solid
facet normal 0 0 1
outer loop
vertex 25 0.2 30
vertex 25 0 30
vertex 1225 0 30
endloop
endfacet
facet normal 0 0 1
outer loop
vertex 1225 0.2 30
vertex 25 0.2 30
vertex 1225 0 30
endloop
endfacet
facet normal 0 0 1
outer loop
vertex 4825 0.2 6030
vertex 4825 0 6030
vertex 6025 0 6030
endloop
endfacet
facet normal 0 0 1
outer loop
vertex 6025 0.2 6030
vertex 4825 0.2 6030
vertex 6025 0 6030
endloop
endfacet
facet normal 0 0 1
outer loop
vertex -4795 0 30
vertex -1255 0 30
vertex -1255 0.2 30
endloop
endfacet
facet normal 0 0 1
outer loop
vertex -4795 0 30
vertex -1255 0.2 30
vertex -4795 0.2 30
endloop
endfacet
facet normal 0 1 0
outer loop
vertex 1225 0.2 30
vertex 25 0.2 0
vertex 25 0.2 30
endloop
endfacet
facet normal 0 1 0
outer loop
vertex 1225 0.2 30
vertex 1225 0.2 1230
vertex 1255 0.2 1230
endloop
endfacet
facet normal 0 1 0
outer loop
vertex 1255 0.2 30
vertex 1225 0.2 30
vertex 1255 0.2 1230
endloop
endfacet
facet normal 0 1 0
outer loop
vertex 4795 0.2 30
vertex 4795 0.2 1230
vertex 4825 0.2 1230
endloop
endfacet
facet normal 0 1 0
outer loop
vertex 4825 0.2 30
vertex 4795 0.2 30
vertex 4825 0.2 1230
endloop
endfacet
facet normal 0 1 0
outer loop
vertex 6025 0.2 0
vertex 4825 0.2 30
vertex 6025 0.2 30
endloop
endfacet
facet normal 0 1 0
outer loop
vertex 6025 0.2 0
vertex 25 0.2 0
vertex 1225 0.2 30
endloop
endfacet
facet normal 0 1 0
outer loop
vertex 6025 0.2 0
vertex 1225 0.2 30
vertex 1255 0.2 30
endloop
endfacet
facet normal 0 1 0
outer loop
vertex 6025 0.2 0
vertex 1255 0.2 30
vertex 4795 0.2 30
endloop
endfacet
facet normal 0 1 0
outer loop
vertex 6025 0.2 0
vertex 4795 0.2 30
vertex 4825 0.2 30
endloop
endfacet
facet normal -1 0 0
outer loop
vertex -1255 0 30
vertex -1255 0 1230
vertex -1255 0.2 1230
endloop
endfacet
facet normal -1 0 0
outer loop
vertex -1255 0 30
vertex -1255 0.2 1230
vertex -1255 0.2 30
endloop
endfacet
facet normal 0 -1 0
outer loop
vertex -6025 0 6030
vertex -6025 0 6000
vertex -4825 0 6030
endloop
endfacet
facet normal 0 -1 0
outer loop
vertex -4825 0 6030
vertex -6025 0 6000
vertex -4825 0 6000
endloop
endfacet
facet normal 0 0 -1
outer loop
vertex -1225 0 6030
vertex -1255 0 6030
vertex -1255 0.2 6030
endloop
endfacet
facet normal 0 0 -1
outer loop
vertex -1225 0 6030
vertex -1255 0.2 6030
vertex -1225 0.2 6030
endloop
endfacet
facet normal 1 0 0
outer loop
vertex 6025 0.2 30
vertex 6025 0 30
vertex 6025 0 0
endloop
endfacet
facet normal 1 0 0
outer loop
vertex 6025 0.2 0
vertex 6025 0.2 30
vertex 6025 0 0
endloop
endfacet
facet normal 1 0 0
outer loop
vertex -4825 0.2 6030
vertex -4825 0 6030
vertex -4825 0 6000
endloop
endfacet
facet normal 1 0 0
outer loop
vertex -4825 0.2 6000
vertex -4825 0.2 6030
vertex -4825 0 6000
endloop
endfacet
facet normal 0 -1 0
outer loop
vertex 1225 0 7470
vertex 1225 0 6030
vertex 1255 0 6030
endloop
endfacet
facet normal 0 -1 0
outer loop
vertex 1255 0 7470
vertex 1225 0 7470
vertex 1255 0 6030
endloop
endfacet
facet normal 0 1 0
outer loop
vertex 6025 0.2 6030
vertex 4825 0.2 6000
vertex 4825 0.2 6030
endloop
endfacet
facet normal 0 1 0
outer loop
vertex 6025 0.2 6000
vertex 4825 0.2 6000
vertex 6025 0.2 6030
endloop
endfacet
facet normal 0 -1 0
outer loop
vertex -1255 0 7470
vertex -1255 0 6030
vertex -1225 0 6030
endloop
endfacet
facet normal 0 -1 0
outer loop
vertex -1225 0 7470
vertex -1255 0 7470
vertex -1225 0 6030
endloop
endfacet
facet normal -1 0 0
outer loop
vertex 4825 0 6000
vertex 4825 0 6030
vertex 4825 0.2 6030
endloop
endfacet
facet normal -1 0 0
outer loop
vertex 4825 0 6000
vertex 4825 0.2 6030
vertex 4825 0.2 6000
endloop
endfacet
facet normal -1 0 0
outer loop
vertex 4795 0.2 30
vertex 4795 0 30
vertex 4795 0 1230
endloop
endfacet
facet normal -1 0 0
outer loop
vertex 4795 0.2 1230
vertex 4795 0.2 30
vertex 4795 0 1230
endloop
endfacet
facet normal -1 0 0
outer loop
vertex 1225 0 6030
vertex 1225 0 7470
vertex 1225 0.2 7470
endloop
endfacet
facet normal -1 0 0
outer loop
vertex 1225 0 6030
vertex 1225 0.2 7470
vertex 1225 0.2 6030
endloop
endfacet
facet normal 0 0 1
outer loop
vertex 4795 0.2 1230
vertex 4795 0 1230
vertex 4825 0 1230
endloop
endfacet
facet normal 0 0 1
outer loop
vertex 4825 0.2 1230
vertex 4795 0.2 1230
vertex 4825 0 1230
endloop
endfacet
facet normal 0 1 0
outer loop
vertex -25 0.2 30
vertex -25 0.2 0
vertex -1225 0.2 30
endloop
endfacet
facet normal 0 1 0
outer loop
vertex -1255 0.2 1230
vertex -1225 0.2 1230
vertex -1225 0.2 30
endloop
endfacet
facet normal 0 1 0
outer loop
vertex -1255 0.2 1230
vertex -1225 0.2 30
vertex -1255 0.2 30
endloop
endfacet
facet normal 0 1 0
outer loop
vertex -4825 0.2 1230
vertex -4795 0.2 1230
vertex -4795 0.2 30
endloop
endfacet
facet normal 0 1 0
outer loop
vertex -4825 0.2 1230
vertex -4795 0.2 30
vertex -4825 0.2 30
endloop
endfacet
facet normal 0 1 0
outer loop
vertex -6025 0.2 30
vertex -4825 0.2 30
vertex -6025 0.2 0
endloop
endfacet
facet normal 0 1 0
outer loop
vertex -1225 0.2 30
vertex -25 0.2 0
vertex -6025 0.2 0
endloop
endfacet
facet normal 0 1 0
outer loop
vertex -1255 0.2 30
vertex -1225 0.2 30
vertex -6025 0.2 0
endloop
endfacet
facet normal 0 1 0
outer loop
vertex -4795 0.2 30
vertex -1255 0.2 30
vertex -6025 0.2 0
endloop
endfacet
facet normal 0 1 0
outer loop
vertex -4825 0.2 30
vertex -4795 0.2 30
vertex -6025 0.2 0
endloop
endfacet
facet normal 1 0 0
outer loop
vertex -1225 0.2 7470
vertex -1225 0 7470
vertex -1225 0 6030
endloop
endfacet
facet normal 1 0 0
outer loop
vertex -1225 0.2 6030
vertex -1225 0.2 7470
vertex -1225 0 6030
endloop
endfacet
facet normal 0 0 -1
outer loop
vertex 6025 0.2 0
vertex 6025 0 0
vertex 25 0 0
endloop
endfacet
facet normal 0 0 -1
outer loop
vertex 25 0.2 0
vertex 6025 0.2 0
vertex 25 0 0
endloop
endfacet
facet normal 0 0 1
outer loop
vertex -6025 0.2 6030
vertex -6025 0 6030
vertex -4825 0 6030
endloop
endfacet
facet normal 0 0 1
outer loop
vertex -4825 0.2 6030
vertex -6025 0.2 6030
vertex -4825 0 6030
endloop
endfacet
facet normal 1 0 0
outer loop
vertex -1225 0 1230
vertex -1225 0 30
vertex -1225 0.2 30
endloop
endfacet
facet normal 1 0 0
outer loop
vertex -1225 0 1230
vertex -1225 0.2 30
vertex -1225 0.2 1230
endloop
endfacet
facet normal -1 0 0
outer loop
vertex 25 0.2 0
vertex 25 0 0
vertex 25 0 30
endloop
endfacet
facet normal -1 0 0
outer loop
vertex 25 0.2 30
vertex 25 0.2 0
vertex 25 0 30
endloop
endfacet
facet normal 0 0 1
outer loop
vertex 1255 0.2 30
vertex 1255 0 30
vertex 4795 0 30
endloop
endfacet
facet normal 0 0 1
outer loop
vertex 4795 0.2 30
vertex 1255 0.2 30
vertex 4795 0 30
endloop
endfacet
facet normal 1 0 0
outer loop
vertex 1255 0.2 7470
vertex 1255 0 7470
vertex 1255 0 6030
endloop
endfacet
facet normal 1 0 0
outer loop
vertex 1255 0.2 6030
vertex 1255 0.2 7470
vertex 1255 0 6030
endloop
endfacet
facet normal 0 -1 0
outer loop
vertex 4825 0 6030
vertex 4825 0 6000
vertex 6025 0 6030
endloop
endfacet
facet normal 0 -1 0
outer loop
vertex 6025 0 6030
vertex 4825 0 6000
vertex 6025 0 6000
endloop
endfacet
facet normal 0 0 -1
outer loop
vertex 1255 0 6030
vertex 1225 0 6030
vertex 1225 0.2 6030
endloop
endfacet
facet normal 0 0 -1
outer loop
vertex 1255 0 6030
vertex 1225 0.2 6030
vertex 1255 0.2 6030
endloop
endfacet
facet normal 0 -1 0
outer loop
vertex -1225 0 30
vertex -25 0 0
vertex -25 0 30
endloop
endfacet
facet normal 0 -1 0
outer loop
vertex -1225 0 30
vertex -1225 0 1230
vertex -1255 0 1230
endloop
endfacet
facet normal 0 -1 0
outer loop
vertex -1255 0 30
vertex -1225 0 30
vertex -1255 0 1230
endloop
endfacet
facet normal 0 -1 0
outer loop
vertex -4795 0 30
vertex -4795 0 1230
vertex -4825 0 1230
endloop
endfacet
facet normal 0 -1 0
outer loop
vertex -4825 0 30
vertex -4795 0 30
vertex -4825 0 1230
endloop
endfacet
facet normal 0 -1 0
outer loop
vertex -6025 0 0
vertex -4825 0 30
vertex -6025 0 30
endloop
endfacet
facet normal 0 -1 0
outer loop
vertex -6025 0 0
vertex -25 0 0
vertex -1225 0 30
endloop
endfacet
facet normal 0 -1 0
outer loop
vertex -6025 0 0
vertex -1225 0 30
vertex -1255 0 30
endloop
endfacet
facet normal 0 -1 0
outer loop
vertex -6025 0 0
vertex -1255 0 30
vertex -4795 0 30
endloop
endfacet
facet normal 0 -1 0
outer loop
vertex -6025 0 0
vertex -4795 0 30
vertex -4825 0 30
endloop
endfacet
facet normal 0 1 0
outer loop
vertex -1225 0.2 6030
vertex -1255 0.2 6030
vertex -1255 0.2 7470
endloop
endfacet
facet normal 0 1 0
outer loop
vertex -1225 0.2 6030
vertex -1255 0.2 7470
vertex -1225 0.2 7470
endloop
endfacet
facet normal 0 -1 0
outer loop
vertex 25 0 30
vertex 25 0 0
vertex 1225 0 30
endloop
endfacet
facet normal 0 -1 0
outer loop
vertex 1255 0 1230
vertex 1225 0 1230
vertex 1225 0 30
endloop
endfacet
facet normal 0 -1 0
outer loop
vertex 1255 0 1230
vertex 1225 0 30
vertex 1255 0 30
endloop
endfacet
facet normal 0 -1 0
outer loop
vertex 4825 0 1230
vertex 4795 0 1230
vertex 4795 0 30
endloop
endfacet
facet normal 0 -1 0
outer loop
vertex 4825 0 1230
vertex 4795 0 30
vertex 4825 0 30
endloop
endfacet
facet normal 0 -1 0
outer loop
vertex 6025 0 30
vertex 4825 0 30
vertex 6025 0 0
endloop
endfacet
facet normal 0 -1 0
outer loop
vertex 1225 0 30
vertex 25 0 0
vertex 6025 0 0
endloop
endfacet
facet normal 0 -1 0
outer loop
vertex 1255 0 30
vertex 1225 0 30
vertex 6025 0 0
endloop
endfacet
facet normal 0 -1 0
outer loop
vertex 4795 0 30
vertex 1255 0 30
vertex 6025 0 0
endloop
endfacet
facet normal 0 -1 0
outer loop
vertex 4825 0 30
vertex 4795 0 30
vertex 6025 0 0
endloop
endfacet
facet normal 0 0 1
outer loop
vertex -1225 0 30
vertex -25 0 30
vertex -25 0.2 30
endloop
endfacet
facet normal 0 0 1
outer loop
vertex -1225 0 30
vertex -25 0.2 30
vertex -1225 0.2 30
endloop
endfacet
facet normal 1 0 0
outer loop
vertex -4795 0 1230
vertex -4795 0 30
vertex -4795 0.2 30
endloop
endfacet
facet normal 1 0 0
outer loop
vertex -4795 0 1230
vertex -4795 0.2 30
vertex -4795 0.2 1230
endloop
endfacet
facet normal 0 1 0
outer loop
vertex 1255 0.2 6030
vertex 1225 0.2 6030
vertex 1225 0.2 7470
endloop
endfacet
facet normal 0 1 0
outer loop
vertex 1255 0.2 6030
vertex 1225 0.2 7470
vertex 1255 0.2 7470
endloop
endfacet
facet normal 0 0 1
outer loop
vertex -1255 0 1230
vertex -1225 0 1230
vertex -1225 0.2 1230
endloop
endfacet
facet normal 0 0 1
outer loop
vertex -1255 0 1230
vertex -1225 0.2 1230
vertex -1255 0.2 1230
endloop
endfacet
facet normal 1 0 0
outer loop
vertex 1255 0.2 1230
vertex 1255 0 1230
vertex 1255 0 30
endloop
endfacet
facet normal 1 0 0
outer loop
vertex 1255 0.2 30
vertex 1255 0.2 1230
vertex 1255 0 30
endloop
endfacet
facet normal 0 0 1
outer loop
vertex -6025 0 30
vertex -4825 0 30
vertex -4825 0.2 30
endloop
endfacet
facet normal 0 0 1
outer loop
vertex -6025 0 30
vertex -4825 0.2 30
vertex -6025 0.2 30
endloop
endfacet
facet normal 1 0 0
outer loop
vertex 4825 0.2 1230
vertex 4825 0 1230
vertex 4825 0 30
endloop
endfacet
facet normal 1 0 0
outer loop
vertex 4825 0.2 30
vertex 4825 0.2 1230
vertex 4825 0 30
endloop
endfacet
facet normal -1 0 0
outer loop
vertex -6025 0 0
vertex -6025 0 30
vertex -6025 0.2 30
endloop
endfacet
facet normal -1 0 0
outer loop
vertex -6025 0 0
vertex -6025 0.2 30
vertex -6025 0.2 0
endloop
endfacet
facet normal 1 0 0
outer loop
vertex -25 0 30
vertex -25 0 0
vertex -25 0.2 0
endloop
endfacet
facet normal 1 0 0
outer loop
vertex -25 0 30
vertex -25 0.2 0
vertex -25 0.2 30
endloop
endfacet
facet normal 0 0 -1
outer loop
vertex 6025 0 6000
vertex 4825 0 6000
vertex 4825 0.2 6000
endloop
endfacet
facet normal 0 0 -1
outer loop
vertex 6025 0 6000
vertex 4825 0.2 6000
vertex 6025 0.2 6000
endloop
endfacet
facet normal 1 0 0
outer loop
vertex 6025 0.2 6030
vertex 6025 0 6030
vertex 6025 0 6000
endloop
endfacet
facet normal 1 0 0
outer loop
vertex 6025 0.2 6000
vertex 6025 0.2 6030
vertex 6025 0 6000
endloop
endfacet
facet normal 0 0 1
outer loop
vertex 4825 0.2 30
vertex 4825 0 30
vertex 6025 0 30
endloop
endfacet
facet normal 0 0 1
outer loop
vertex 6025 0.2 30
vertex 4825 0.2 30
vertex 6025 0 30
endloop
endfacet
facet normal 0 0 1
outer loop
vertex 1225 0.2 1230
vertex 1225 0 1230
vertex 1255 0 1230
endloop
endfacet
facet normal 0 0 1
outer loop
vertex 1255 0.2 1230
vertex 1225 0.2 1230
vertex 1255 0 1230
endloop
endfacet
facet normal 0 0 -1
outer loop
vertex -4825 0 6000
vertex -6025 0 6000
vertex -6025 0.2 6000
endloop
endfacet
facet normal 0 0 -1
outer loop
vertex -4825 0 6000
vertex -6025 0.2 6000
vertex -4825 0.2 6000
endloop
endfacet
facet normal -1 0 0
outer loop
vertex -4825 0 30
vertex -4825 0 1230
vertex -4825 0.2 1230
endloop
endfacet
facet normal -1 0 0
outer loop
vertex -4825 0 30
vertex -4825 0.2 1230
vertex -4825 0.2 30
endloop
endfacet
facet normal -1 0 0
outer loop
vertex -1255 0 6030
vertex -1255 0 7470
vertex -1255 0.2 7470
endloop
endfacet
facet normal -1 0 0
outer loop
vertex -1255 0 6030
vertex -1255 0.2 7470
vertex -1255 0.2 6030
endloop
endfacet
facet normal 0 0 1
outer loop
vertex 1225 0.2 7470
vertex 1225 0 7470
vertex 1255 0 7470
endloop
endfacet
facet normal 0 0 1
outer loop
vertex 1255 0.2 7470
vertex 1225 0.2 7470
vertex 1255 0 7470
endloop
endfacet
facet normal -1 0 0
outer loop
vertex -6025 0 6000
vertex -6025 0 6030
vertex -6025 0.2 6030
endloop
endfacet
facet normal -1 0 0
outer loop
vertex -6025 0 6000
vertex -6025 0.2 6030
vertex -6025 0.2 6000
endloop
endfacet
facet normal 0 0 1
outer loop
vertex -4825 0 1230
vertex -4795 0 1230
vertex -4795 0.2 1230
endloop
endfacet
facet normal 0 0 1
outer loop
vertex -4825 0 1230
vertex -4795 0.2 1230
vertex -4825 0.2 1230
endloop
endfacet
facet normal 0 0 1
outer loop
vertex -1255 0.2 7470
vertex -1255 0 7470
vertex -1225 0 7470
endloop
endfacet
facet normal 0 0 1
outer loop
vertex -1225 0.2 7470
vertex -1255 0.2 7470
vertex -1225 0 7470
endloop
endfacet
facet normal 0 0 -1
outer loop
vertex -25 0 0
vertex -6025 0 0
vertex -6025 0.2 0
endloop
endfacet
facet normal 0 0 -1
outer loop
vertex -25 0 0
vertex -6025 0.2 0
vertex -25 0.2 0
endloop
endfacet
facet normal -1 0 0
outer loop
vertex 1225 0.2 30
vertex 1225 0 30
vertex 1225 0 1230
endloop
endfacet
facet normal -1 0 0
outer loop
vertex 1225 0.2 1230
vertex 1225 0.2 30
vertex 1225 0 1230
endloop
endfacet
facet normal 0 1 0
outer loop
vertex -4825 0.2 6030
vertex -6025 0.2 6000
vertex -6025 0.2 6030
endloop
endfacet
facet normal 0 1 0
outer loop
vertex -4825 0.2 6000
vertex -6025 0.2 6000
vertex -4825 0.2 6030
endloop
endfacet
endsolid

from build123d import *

# Parameters (mm, degrees)
EXTRUDE_1_DEPTH   = 0.2
SKETCH_1_W        = 1200
SKETCH_1_H        = 30
EXTRUDE_1_2_DEPTH = 0.2
SKETCH_1_W_2      = 30
SKETCH_1_H_2      = 1440
EXTRUDE_1_3_DEPTH = 0.2
EXTRUDE_1_4_DEPTH = 0.2
EXTRUDE_1_5_DEPTH = 0.2
EXTRUDE_1_6_DEPTH = 0.2


with BuildPart() as part:
    # 草图1 → 凸台-拉伸1 (new body)
    with BuildSketch(Plane(origin=(0, 0, 0), x_dir=(1, 0, 0), z_dir=(0, 1, 0))):
        Polygon((-6025, 0), (-25, 0), (-25, -30), (-1225, -30), (-1225, -1230), (-1255, -1230), (-1255, -30), (-4795, -30), (-4795, -1230), (-4825, -1230), (-4825, -30), (-6025, -30), align=None)
    extrude(amount=EXTRUDE_1_DEPTH)


with BuildPart() as body_2:
    # 草图1 → Extrude 1 2 (new body)
    with BuildSketch(Plane(origin=(0, 0, 0), x_dir=(1, 0, 0), z_dir=(0, 1, 0))):
        with Locations((-5425, -6015)):
            Rectangle(SKETCH_1_W, SKETCH_1_H)
    extrude(amount=EXTRUDE_1_2_DEPTH)


with BuildPart() as body_3:
    # 草图1 → Extrude 1 3 (new body)
    with BuildSketch(Plane(origin=(0, 0, 0), x_dir=(1, 0, 0), z_dir=(0, 1, 0))):
        with Locations((-1240, -6750)):
            Rectangle(SKETCH_1_W_2, SKETCH_1_H_2)
    extrude(amount=EXTRUDE_1_3_DEPTH)


with BuildPart() as body_4:
    # 草图1 → Extrude 1 4 (new body)
    with BuildSketch(Plane(origin=(0, 0, 0), x_dir=(1, 0, 0), z_dir=(0, 1, 0))):
        with Locations((5425, -6015)):
            Rectangle(SKETCH_1_W, SKETCH_1_H)
    extrude(amount=EXTRUDE_1_4_DEPTH)


with BuildPart() as body_5:
    # 草图1 → Extrude 1 5 (new body)
    with BuildSketch(Plane(origin=(0, 0, 0), x_dir=(1, 0, 0), z_dir=(0, 1, 0))):
        with Locations((1240, -6750)):
            Rectangle(SKETCH_1_W_2, SKETCH_1_H_2)
    extrude(amount=EXTRUDE_1_5_DEPTH)


with BuildPart() as body_6:
    # 草图1 → Extrude 1 6 (new body)
    with BuildSketch(Plane(origin=(0, 0, 0), x_dir=(1, 0, 0), z_dir=(0, 1, 0))):
        Polygon((4825, -30), (6025, -30), (6025, 0), (25, 0), (25, -30), (1225, -30), (1225, -1230), (1255, -1230), (1255, -30), (4795, -30), (4795, -1230), (4825, -1230), align=None)
    extrude(amount=EXTRUDE_1_6_DEPTH)


solid = Compound([part.part, body_2.part, body_3.part, body_4.part, body_5.part, body_6.part])
